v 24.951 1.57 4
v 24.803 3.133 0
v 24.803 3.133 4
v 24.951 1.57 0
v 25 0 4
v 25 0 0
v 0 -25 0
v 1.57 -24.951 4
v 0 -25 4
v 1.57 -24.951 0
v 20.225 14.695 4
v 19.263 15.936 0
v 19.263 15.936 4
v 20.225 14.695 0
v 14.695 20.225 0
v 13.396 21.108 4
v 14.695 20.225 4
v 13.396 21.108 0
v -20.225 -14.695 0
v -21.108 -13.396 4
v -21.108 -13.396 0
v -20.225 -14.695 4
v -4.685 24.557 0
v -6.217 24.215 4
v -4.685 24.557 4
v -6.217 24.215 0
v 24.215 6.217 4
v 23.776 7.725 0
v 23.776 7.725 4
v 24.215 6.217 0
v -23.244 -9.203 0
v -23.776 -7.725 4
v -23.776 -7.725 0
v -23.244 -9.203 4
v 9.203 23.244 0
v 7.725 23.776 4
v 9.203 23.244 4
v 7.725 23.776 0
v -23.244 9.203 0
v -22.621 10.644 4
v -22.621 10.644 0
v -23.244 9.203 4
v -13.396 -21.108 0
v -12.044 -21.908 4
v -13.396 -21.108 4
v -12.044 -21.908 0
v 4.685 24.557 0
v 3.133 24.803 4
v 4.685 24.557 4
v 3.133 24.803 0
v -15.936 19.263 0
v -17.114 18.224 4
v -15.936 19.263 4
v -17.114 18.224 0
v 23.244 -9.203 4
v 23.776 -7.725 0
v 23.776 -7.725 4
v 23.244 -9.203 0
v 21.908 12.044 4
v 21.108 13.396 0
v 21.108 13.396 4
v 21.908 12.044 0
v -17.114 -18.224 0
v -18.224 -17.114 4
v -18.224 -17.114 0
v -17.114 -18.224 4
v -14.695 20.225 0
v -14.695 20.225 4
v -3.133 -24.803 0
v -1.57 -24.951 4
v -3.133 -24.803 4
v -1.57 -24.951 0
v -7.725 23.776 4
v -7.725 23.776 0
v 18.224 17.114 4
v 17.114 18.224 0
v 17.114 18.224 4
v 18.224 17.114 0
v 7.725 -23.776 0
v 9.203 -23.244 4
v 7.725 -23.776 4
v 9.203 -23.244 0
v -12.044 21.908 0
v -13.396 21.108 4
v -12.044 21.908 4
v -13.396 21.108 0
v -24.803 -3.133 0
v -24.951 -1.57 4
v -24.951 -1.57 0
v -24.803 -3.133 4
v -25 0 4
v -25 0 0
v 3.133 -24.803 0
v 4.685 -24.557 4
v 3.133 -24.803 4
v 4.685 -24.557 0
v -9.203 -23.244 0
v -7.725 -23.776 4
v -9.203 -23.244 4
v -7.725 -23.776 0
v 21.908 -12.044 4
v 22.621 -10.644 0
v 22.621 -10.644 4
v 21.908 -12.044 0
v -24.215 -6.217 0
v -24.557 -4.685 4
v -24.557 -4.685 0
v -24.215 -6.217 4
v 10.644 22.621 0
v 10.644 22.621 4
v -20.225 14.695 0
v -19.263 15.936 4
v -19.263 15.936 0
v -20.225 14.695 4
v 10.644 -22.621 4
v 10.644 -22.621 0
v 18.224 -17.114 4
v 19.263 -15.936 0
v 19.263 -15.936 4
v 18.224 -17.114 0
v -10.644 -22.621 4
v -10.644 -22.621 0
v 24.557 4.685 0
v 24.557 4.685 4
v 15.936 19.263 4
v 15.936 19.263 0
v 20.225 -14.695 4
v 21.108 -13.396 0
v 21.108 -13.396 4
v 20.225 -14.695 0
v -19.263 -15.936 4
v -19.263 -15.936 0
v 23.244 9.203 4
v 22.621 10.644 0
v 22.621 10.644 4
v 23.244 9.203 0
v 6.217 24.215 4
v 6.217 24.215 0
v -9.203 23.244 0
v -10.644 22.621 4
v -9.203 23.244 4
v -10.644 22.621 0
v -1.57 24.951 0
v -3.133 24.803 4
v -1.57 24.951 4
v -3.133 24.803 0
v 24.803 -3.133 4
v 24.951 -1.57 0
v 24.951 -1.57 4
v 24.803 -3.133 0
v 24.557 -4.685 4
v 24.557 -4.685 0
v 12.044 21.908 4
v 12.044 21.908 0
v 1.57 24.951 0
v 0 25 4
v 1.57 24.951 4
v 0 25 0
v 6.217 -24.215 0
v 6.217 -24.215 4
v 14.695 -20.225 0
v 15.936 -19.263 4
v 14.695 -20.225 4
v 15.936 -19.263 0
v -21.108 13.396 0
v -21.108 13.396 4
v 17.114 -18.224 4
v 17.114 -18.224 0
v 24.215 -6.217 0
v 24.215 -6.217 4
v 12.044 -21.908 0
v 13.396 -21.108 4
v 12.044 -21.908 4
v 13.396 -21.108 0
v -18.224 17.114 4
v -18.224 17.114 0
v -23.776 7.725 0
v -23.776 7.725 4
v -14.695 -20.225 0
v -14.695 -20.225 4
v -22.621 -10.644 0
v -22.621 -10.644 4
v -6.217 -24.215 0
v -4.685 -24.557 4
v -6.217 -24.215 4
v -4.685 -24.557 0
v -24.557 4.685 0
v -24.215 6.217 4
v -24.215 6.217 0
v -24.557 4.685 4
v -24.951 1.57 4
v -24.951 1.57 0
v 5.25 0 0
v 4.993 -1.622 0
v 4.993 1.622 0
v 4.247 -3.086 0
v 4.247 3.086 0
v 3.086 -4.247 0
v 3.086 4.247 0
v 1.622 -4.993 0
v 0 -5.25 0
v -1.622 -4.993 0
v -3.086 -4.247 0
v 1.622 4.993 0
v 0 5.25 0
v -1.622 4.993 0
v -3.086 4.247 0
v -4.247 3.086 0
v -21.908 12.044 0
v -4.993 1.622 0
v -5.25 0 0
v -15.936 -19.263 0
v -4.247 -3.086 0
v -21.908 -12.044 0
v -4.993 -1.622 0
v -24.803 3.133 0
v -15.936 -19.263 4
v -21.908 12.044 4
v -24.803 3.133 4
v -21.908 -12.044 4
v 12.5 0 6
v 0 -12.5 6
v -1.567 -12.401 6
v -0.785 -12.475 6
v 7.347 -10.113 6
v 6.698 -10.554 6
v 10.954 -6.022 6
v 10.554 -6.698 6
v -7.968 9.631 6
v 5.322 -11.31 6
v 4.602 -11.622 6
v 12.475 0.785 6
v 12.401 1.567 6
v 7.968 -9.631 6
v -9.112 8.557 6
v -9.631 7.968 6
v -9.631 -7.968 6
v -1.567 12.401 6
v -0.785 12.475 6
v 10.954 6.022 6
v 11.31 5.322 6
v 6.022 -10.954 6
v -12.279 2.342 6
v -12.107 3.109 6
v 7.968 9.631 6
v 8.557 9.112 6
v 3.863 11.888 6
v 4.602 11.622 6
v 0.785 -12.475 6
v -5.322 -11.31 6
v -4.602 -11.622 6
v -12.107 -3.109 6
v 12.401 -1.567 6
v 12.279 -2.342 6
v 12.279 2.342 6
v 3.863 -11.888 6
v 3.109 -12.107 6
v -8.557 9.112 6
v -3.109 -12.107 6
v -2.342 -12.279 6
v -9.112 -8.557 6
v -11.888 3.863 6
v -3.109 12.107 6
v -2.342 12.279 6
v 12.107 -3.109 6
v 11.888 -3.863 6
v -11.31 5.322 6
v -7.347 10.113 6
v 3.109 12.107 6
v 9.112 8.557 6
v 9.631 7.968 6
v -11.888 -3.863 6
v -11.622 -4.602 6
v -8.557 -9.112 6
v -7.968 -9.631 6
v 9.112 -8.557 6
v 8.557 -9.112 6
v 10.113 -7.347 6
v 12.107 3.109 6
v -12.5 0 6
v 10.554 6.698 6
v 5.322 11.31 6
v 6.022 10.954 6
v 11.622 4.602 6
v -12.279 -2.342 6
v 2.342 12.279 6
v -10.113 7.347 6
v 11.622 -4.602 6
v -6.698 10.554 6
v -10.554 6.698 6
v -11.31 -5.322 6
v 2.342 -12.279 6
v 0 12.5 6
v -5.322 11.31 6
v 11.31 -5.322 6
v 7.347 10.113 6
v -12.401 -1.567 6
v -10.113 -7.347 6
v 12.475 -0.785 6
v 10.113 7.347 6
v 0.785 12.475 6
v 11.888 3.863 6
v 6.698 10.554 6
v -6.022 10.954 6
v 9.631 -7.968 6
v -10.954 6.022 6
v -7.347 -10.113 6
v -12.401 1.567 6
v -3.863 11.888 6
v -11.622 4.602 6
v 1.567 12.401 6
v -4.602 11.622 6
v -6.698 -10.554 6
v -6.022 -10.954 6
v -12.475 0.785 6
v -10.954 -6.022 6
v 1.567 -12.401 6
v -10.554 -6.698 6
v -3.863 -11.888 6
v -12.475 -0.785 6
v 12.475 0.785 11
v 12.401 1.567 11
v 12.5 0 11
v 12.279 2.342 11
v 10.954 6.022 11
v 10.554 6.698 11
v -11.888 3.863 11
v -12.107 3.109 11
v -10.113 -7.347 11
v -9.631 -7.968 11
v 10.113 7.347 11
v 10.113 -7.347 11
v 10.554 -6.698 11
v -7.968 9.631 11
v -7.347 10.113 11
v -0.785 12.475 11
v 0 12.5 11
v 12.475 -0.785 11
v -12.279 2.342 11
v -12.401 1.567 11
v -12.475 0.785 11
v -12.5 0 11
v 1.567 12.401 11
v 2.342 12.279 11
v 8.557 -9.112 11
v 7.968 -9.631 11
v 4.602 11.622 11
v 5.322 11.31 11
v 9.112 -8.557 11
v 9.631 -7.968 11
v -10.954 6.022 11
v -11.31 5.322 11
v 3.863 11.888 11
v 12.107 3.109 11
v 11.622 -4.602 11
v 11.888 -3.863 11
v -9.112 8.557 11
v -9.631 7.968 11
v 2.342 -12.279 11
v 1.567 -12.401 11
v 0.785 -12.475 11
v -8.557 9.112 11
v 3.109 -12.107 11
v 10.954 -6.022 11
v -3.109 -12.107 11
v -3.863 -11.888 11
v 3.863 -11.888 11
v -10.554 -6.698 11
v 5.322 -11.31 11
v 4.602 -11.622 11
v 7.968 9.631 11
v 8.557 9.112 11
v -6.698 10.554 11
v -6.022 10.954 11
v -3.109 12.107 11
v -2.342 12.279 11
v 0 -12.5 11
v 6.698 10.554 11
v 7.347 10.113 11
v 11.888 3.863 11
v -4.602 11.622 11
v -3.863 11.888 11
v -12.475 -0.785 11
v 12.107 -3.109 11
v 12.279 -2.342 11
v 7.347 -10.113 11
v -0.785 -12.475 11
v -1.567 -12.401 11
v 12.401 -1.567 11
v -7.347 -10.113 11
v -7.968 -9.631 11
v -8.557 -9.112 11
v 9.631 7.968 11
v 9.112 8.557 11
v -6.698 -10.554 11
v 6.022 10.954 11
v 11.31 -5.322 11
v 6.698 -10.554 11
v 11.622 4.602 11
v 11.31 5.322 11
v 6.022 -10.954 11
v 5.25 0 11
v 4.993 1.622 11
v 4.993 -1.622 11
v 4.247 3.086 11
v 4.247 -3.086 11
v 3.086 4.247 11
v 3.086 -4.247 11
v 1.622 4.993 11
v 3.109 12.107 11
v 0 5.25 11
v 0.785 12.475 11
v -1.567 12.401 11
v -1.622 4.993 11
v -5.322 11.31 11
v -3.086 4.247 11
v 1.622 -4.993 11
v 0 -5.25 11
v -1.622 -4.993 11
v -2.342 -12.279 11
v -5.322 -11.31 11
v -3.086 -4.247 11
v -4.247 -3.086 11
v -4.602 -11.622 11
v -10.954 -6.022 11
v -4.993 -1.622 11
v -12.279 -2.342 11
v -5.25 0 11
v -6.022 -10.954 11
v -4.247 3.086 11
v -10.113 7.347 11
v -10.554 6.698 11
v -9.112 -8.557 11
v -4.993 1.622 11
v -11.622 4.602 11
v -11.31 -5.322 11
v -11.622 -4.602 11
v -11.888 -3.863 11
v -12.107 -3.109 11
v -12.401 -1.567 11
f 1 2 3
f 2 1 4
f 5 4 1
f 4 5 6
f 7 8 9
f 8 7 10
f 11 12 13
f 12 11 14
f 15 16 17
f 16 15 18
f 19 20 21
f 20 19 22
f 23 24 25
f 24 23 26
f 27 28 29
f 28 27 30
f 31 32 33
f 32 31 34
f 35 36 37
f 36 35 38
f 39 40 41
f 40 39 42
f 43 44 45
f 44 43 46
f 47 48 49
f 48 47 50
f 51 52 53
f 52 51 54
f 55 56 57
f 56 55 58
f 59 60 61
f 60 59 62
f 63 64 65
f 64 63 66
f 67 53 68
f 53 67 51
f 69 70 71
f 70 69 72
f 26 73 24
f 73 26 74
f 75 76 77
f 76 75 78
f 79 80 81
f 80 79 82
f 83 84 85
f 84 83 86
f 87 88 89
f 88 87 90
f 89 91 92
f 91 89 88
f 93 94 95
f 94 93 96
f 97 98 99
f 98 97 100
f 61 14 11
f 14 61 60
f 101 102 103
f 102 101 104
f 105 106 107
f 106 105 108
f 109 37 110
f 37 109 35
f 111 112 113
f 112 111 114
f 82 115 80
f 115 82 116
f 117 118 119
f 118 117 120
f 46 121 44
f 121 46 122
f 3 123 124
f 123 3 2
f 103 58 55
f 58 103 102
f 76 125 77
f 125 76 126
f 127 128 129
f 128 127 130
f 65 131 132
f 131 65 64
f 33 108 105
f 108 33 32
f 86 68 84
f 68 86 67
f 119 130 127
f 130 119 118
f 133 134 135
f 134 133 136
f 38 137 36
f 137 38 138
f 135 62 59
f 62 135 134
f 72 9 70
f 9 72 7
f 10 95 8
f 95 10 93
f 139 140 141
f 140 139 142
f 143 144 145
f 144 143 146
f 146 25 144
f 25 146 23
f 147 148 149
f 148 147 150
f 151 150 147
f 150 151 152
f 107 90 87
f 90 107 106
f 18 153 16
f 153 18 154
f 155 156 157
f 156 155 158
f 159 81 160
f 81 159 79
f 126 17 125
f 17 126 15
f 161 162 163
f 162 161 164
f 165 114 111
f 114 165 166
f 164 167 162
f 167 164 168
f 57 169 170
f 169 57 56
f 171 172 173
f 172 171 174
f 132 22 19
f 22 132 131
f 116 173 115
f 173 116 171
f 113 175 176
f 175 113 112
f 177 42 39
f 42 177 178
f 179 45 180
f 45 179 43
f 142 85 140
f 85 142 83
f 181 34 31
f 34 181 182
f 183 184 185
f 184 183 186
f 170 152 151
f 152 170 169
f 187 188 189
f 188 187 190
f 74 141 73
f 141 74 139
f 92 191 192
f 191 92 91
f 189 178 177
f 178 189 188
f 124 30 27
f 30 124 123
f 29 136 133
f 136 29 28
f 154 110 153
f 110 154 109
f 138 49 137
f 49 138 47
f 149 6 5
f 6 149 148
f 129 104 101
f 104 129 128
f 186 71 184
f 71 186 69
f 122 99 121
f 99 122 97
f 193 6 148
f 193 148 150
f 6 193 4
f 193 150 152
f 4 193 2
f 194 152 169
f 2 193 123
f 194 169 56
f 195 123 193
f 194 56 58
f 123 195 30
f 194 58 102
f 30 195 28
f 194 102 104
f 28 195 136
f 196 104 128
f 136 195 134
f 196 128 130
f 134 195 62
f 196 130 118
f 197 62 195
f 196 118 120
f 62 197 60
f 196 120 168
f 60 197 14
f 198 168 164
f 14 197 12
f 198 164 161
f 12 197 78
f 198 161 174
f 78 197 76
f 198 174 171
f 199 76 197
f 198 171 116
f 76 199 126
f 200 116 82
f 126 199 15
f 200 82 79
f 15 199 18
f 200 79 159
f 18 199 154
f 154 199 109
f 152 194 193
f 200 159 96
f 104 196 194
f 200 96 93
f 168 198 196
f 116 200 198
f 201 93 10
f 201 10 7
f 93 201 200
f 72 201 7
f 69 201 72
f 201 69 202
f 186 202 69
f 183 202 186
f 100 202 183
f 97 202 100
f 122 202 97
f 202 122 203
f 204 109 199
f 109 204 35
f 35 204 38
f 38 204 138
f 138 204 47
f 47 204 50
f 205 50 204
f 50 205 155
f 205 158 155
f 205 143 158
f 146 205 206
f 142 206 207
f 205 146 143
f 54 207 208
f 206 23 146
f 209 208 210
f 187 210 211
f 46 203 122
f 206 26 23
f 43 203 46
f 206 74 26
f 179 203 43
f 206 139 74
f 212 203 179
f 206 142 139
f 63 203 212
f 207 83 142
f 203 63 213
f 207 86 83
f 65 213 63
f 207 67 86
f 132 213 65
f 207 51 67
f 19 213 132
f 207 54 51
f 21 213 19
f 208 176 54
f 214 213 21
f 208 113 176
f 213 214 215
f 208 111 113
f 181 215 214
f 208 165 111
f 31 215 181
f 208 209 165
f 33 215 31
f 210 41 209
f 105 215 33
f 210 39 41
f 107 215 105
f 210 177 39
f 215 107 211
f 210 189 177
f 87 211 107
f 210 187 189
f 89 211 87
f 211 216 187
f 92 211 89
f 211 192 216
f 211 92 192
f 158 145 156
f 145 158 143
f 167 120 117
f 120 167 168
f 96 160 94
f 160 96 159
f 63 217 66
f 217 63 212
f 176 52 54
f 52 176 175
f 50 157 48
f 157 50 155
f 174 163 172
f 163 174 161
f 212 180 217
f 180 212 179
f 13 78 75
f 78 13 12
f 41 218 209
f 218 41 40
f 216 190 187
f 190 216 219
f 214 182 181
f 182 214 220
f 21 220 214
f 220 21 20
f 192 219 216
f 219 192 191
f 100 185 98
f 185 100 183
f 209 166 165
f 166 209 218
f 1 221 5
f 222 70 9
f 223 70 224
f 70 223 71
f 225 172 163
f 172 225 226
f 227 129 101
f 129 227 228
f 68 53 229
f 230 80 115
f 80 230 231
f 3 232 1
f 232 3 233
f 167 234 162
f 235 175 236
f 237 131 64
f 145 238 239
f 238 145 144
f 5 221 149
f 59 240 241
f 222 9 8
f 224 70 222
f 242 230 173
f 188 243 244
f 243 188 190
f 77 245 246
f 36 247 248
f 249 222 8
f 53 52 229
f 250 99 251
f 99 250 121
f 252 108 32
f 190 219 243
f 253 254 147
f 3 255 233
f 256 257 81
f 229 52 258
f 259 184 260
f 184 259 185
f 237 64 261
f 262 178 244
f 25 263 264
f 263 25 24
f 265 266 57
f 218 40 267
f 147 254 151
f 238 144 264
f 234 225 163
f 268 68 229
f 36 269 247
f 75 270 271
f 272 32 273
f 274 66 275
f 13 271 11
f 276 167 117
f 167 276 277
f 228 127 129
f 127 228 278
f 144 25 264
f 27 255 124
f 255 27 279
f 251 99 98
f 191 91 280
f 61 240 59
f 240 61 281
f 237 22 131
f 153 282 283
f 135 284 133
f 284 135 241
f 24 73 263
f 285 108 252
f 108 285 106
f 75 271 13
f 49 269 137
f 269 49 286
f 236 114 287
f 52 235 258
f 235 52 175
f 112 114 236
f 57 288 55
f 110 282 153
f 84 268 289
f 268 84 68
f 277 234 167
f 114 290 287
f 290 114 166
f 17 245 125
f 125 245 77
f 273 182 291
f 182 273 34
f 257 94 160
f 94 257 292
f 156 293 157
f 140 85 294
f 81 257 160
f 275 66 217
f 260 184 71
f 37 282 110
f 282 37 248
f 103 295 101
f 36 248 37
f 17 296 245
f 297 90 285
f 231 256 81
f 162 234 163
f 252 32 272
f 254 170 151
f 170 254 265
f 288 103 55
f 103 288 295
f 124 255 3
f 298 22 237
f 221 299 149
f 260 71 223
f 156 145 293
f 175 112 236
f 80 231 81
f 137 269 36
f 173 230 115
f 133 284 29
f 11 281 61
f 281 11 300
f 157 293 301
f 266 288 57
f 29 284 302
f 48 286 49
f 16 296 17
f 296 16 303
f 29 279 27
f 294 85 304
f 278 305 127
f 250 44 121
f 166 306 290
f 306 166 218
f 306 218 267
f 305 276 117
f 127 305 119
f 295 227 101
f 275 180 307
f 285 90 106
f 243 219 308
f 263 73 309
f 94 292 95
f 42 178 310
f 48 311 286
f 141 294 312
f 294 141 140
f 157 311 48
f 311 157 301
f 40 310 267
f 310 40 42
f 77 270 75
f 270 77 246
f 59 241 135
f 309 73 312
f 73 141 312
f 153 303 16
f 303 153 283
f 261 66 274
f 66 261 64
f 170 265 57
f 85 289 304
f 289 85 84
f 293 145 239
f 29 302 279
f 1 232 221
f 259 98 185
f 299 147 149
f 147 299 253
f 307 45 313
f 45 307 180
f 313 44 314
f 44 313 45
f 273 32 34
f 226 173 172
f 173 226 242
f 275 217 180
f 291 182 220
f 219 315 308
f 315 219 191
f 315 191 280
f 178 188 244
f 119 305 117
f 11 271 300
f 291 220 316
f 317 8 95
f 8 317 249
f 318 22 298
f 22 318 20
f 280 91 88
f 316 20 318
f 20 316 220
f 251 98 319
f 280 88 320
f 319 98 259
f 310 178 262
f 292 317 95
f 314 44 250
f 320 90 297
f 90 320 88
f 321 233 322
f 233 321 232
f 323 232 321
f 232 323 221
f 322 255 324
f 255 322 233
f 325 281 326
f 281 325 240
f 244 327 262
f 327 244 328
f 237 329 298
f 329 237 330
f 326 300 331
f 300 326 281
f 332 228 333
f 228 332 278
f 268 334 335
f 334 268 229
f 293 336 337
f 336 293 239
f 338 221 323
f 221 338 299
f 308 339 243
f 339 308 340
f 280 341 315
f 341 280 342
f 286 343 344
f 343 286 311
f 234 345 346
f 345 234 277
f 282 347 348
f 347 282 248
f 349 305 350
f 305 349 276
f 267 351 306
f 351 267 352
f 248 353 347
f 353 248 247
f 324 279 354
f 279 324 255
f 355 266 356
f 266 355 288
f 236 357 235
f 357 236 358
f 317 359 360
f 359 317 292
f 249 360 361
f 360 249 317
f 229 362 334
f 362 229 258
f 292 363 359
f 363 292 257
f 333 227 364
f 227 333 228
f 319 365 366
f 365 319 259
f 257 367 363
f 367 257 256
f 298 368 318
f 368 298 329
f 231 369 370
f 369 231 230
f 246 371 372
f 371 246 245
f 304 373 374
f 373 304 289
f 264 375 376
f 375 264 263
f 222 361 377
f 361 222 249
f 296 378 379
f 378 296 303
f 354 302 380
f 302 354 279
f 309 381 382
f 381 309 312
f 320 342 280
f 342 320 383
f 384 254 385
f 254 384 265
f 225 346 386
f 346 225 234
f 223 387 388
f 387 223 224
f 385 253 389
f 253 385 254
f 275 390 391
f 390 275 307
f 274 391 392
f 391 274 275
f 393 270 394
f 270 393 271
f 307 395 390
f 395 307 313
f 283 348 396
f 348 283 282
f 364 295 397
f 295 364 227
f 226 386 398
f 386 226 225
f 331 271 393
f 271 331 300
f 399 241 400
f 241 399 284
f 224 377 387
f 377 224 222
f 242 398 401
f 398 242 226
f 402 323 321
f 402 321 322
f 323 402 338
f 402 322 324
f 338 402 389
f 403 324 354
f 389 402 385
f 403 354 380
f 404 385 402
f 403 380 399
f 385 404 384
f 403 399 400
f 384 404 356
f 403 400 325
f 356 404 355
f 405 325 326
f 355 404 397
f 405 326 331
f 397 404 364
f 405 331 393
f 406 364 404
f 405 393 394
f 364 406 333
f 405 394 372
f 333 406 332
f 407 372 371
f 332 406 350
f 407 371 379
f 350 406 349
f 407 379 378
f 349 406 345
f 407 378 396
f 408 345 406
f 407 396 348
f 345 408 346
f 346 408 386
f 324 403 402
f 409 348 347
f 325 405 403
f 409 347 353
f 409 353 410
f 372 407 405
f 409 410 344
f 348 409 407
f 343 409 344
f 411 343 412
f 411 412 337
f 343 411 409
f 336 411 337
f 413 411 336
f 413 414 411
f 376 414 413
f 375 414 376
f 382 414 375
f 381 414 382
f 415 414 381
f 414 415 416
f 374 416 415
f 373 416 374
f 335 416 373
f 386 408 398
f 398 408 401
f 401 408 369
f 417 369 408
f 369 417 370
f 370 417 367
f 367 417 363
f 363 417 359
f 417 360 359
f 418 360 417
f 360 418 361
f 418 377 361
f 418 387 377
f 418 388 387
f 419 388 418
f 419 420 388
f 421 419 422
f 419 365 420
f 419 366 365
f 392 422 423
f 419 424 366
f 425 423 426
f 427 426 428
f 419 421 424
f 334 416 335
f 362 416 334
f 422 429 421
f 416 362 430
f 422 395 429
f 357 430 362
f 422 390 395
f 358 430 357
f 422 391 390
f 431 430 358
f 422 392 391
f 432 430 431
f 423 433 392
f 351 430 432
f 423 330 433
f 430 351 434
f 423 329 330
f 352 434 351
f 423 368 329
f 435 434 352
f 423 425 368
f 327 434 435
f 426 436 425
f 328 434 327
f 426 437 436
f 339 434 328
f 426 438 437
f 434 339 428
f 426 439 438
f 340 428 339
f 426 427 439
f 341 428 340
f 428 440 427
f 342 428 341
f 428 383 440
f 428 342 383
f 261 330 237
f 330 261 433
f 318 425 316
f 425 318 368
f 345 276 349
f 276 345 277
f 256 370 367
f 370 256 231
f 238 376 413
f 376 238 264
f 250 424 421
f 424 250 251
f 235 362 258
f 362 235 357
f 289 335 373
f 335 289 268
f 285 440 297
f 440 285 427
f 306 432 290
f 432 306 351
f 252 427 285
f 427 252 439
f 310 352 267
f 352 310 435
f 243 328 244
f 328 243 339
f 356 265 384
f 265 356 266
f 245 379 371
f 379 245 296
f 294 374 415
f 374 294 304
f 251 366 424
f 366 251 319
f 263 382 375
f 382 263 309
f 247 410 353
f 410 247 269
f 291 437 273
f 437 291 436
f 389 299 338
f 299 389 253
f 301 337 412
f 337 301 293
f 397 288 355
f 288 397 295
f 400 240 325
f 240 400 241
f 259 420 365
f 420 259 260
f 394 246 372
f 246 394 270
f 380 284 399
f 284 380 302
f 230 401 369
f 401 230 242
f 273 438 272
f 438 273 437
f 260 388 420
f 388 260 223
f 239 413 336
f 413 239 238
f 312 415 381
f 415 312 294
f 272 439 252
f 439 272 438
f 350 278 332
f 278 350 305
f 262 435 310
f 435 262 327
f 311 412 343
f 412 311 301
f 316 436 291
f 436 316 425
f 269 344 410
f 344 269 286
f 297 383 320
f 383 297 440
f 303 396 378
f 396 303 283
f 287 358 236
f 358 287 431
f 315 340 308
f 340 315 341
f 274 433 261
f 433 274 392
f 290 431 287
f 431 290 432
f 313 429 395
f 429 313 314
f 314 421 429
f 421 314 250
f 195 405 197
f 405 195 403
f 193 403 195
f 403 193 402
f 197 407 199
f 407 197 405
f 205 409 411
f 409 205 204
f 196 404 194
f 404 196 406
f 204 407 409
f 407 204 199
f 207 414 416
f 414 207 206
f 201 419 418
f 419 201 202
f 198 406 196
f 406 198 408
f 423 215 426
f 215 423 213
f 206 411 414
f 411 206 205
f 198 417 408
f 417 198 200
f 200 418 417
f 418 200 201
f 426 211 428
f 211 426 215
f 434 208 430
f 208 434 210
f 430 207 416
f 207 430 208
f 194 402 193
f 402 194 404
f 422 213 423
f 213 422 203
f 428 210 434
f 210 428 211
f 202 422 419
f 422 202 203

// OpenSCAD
//RUEDA con radios 
//parametros rueda

//medidas del aro externo de la rueda.
diametro=50; //diametro externo de la rueda. influye en la velocidad.
grosor=4;	// grosor del aro externo de la rueda
altura_hub=7;
altura_bisel=2;

//medidas de los radios
//grosor_radios=8; //grosor o altura de los radios

//medidas del hub central
//diam_eje=4;  //eje central por el que pasa el tornillo de izquierdas



//medidas de los agujeros del hub
metrica_hub=3;

module rueda(gros=grosor, diam=diametro)
{
	difference(){
		
				
				union(){
					cylinder (r=diam/2, h=gros, $fn=100);
					translate([0,0,grosor])
					cylinder (r1=diam/2,r2=25/2, h=altura_bisel, $fn=100);
					translate([0,0,grosor])
					cylinder (r=25/2, h=altura_hub, $fn=100);
					
				}
				cylinder (r=10.5/2, h=100, $fn=20, center=true);
				//translate([8,0,0])
				//cylinder (r=3.5/2, h=100, $fn=20, center=true);
				//translate([-8,0,0])
				//cylinder (r=3.5/2, h=100, $fn=20, center=true);
			
	}//fin diference
}




	
	rueda();
	
	

	




	
